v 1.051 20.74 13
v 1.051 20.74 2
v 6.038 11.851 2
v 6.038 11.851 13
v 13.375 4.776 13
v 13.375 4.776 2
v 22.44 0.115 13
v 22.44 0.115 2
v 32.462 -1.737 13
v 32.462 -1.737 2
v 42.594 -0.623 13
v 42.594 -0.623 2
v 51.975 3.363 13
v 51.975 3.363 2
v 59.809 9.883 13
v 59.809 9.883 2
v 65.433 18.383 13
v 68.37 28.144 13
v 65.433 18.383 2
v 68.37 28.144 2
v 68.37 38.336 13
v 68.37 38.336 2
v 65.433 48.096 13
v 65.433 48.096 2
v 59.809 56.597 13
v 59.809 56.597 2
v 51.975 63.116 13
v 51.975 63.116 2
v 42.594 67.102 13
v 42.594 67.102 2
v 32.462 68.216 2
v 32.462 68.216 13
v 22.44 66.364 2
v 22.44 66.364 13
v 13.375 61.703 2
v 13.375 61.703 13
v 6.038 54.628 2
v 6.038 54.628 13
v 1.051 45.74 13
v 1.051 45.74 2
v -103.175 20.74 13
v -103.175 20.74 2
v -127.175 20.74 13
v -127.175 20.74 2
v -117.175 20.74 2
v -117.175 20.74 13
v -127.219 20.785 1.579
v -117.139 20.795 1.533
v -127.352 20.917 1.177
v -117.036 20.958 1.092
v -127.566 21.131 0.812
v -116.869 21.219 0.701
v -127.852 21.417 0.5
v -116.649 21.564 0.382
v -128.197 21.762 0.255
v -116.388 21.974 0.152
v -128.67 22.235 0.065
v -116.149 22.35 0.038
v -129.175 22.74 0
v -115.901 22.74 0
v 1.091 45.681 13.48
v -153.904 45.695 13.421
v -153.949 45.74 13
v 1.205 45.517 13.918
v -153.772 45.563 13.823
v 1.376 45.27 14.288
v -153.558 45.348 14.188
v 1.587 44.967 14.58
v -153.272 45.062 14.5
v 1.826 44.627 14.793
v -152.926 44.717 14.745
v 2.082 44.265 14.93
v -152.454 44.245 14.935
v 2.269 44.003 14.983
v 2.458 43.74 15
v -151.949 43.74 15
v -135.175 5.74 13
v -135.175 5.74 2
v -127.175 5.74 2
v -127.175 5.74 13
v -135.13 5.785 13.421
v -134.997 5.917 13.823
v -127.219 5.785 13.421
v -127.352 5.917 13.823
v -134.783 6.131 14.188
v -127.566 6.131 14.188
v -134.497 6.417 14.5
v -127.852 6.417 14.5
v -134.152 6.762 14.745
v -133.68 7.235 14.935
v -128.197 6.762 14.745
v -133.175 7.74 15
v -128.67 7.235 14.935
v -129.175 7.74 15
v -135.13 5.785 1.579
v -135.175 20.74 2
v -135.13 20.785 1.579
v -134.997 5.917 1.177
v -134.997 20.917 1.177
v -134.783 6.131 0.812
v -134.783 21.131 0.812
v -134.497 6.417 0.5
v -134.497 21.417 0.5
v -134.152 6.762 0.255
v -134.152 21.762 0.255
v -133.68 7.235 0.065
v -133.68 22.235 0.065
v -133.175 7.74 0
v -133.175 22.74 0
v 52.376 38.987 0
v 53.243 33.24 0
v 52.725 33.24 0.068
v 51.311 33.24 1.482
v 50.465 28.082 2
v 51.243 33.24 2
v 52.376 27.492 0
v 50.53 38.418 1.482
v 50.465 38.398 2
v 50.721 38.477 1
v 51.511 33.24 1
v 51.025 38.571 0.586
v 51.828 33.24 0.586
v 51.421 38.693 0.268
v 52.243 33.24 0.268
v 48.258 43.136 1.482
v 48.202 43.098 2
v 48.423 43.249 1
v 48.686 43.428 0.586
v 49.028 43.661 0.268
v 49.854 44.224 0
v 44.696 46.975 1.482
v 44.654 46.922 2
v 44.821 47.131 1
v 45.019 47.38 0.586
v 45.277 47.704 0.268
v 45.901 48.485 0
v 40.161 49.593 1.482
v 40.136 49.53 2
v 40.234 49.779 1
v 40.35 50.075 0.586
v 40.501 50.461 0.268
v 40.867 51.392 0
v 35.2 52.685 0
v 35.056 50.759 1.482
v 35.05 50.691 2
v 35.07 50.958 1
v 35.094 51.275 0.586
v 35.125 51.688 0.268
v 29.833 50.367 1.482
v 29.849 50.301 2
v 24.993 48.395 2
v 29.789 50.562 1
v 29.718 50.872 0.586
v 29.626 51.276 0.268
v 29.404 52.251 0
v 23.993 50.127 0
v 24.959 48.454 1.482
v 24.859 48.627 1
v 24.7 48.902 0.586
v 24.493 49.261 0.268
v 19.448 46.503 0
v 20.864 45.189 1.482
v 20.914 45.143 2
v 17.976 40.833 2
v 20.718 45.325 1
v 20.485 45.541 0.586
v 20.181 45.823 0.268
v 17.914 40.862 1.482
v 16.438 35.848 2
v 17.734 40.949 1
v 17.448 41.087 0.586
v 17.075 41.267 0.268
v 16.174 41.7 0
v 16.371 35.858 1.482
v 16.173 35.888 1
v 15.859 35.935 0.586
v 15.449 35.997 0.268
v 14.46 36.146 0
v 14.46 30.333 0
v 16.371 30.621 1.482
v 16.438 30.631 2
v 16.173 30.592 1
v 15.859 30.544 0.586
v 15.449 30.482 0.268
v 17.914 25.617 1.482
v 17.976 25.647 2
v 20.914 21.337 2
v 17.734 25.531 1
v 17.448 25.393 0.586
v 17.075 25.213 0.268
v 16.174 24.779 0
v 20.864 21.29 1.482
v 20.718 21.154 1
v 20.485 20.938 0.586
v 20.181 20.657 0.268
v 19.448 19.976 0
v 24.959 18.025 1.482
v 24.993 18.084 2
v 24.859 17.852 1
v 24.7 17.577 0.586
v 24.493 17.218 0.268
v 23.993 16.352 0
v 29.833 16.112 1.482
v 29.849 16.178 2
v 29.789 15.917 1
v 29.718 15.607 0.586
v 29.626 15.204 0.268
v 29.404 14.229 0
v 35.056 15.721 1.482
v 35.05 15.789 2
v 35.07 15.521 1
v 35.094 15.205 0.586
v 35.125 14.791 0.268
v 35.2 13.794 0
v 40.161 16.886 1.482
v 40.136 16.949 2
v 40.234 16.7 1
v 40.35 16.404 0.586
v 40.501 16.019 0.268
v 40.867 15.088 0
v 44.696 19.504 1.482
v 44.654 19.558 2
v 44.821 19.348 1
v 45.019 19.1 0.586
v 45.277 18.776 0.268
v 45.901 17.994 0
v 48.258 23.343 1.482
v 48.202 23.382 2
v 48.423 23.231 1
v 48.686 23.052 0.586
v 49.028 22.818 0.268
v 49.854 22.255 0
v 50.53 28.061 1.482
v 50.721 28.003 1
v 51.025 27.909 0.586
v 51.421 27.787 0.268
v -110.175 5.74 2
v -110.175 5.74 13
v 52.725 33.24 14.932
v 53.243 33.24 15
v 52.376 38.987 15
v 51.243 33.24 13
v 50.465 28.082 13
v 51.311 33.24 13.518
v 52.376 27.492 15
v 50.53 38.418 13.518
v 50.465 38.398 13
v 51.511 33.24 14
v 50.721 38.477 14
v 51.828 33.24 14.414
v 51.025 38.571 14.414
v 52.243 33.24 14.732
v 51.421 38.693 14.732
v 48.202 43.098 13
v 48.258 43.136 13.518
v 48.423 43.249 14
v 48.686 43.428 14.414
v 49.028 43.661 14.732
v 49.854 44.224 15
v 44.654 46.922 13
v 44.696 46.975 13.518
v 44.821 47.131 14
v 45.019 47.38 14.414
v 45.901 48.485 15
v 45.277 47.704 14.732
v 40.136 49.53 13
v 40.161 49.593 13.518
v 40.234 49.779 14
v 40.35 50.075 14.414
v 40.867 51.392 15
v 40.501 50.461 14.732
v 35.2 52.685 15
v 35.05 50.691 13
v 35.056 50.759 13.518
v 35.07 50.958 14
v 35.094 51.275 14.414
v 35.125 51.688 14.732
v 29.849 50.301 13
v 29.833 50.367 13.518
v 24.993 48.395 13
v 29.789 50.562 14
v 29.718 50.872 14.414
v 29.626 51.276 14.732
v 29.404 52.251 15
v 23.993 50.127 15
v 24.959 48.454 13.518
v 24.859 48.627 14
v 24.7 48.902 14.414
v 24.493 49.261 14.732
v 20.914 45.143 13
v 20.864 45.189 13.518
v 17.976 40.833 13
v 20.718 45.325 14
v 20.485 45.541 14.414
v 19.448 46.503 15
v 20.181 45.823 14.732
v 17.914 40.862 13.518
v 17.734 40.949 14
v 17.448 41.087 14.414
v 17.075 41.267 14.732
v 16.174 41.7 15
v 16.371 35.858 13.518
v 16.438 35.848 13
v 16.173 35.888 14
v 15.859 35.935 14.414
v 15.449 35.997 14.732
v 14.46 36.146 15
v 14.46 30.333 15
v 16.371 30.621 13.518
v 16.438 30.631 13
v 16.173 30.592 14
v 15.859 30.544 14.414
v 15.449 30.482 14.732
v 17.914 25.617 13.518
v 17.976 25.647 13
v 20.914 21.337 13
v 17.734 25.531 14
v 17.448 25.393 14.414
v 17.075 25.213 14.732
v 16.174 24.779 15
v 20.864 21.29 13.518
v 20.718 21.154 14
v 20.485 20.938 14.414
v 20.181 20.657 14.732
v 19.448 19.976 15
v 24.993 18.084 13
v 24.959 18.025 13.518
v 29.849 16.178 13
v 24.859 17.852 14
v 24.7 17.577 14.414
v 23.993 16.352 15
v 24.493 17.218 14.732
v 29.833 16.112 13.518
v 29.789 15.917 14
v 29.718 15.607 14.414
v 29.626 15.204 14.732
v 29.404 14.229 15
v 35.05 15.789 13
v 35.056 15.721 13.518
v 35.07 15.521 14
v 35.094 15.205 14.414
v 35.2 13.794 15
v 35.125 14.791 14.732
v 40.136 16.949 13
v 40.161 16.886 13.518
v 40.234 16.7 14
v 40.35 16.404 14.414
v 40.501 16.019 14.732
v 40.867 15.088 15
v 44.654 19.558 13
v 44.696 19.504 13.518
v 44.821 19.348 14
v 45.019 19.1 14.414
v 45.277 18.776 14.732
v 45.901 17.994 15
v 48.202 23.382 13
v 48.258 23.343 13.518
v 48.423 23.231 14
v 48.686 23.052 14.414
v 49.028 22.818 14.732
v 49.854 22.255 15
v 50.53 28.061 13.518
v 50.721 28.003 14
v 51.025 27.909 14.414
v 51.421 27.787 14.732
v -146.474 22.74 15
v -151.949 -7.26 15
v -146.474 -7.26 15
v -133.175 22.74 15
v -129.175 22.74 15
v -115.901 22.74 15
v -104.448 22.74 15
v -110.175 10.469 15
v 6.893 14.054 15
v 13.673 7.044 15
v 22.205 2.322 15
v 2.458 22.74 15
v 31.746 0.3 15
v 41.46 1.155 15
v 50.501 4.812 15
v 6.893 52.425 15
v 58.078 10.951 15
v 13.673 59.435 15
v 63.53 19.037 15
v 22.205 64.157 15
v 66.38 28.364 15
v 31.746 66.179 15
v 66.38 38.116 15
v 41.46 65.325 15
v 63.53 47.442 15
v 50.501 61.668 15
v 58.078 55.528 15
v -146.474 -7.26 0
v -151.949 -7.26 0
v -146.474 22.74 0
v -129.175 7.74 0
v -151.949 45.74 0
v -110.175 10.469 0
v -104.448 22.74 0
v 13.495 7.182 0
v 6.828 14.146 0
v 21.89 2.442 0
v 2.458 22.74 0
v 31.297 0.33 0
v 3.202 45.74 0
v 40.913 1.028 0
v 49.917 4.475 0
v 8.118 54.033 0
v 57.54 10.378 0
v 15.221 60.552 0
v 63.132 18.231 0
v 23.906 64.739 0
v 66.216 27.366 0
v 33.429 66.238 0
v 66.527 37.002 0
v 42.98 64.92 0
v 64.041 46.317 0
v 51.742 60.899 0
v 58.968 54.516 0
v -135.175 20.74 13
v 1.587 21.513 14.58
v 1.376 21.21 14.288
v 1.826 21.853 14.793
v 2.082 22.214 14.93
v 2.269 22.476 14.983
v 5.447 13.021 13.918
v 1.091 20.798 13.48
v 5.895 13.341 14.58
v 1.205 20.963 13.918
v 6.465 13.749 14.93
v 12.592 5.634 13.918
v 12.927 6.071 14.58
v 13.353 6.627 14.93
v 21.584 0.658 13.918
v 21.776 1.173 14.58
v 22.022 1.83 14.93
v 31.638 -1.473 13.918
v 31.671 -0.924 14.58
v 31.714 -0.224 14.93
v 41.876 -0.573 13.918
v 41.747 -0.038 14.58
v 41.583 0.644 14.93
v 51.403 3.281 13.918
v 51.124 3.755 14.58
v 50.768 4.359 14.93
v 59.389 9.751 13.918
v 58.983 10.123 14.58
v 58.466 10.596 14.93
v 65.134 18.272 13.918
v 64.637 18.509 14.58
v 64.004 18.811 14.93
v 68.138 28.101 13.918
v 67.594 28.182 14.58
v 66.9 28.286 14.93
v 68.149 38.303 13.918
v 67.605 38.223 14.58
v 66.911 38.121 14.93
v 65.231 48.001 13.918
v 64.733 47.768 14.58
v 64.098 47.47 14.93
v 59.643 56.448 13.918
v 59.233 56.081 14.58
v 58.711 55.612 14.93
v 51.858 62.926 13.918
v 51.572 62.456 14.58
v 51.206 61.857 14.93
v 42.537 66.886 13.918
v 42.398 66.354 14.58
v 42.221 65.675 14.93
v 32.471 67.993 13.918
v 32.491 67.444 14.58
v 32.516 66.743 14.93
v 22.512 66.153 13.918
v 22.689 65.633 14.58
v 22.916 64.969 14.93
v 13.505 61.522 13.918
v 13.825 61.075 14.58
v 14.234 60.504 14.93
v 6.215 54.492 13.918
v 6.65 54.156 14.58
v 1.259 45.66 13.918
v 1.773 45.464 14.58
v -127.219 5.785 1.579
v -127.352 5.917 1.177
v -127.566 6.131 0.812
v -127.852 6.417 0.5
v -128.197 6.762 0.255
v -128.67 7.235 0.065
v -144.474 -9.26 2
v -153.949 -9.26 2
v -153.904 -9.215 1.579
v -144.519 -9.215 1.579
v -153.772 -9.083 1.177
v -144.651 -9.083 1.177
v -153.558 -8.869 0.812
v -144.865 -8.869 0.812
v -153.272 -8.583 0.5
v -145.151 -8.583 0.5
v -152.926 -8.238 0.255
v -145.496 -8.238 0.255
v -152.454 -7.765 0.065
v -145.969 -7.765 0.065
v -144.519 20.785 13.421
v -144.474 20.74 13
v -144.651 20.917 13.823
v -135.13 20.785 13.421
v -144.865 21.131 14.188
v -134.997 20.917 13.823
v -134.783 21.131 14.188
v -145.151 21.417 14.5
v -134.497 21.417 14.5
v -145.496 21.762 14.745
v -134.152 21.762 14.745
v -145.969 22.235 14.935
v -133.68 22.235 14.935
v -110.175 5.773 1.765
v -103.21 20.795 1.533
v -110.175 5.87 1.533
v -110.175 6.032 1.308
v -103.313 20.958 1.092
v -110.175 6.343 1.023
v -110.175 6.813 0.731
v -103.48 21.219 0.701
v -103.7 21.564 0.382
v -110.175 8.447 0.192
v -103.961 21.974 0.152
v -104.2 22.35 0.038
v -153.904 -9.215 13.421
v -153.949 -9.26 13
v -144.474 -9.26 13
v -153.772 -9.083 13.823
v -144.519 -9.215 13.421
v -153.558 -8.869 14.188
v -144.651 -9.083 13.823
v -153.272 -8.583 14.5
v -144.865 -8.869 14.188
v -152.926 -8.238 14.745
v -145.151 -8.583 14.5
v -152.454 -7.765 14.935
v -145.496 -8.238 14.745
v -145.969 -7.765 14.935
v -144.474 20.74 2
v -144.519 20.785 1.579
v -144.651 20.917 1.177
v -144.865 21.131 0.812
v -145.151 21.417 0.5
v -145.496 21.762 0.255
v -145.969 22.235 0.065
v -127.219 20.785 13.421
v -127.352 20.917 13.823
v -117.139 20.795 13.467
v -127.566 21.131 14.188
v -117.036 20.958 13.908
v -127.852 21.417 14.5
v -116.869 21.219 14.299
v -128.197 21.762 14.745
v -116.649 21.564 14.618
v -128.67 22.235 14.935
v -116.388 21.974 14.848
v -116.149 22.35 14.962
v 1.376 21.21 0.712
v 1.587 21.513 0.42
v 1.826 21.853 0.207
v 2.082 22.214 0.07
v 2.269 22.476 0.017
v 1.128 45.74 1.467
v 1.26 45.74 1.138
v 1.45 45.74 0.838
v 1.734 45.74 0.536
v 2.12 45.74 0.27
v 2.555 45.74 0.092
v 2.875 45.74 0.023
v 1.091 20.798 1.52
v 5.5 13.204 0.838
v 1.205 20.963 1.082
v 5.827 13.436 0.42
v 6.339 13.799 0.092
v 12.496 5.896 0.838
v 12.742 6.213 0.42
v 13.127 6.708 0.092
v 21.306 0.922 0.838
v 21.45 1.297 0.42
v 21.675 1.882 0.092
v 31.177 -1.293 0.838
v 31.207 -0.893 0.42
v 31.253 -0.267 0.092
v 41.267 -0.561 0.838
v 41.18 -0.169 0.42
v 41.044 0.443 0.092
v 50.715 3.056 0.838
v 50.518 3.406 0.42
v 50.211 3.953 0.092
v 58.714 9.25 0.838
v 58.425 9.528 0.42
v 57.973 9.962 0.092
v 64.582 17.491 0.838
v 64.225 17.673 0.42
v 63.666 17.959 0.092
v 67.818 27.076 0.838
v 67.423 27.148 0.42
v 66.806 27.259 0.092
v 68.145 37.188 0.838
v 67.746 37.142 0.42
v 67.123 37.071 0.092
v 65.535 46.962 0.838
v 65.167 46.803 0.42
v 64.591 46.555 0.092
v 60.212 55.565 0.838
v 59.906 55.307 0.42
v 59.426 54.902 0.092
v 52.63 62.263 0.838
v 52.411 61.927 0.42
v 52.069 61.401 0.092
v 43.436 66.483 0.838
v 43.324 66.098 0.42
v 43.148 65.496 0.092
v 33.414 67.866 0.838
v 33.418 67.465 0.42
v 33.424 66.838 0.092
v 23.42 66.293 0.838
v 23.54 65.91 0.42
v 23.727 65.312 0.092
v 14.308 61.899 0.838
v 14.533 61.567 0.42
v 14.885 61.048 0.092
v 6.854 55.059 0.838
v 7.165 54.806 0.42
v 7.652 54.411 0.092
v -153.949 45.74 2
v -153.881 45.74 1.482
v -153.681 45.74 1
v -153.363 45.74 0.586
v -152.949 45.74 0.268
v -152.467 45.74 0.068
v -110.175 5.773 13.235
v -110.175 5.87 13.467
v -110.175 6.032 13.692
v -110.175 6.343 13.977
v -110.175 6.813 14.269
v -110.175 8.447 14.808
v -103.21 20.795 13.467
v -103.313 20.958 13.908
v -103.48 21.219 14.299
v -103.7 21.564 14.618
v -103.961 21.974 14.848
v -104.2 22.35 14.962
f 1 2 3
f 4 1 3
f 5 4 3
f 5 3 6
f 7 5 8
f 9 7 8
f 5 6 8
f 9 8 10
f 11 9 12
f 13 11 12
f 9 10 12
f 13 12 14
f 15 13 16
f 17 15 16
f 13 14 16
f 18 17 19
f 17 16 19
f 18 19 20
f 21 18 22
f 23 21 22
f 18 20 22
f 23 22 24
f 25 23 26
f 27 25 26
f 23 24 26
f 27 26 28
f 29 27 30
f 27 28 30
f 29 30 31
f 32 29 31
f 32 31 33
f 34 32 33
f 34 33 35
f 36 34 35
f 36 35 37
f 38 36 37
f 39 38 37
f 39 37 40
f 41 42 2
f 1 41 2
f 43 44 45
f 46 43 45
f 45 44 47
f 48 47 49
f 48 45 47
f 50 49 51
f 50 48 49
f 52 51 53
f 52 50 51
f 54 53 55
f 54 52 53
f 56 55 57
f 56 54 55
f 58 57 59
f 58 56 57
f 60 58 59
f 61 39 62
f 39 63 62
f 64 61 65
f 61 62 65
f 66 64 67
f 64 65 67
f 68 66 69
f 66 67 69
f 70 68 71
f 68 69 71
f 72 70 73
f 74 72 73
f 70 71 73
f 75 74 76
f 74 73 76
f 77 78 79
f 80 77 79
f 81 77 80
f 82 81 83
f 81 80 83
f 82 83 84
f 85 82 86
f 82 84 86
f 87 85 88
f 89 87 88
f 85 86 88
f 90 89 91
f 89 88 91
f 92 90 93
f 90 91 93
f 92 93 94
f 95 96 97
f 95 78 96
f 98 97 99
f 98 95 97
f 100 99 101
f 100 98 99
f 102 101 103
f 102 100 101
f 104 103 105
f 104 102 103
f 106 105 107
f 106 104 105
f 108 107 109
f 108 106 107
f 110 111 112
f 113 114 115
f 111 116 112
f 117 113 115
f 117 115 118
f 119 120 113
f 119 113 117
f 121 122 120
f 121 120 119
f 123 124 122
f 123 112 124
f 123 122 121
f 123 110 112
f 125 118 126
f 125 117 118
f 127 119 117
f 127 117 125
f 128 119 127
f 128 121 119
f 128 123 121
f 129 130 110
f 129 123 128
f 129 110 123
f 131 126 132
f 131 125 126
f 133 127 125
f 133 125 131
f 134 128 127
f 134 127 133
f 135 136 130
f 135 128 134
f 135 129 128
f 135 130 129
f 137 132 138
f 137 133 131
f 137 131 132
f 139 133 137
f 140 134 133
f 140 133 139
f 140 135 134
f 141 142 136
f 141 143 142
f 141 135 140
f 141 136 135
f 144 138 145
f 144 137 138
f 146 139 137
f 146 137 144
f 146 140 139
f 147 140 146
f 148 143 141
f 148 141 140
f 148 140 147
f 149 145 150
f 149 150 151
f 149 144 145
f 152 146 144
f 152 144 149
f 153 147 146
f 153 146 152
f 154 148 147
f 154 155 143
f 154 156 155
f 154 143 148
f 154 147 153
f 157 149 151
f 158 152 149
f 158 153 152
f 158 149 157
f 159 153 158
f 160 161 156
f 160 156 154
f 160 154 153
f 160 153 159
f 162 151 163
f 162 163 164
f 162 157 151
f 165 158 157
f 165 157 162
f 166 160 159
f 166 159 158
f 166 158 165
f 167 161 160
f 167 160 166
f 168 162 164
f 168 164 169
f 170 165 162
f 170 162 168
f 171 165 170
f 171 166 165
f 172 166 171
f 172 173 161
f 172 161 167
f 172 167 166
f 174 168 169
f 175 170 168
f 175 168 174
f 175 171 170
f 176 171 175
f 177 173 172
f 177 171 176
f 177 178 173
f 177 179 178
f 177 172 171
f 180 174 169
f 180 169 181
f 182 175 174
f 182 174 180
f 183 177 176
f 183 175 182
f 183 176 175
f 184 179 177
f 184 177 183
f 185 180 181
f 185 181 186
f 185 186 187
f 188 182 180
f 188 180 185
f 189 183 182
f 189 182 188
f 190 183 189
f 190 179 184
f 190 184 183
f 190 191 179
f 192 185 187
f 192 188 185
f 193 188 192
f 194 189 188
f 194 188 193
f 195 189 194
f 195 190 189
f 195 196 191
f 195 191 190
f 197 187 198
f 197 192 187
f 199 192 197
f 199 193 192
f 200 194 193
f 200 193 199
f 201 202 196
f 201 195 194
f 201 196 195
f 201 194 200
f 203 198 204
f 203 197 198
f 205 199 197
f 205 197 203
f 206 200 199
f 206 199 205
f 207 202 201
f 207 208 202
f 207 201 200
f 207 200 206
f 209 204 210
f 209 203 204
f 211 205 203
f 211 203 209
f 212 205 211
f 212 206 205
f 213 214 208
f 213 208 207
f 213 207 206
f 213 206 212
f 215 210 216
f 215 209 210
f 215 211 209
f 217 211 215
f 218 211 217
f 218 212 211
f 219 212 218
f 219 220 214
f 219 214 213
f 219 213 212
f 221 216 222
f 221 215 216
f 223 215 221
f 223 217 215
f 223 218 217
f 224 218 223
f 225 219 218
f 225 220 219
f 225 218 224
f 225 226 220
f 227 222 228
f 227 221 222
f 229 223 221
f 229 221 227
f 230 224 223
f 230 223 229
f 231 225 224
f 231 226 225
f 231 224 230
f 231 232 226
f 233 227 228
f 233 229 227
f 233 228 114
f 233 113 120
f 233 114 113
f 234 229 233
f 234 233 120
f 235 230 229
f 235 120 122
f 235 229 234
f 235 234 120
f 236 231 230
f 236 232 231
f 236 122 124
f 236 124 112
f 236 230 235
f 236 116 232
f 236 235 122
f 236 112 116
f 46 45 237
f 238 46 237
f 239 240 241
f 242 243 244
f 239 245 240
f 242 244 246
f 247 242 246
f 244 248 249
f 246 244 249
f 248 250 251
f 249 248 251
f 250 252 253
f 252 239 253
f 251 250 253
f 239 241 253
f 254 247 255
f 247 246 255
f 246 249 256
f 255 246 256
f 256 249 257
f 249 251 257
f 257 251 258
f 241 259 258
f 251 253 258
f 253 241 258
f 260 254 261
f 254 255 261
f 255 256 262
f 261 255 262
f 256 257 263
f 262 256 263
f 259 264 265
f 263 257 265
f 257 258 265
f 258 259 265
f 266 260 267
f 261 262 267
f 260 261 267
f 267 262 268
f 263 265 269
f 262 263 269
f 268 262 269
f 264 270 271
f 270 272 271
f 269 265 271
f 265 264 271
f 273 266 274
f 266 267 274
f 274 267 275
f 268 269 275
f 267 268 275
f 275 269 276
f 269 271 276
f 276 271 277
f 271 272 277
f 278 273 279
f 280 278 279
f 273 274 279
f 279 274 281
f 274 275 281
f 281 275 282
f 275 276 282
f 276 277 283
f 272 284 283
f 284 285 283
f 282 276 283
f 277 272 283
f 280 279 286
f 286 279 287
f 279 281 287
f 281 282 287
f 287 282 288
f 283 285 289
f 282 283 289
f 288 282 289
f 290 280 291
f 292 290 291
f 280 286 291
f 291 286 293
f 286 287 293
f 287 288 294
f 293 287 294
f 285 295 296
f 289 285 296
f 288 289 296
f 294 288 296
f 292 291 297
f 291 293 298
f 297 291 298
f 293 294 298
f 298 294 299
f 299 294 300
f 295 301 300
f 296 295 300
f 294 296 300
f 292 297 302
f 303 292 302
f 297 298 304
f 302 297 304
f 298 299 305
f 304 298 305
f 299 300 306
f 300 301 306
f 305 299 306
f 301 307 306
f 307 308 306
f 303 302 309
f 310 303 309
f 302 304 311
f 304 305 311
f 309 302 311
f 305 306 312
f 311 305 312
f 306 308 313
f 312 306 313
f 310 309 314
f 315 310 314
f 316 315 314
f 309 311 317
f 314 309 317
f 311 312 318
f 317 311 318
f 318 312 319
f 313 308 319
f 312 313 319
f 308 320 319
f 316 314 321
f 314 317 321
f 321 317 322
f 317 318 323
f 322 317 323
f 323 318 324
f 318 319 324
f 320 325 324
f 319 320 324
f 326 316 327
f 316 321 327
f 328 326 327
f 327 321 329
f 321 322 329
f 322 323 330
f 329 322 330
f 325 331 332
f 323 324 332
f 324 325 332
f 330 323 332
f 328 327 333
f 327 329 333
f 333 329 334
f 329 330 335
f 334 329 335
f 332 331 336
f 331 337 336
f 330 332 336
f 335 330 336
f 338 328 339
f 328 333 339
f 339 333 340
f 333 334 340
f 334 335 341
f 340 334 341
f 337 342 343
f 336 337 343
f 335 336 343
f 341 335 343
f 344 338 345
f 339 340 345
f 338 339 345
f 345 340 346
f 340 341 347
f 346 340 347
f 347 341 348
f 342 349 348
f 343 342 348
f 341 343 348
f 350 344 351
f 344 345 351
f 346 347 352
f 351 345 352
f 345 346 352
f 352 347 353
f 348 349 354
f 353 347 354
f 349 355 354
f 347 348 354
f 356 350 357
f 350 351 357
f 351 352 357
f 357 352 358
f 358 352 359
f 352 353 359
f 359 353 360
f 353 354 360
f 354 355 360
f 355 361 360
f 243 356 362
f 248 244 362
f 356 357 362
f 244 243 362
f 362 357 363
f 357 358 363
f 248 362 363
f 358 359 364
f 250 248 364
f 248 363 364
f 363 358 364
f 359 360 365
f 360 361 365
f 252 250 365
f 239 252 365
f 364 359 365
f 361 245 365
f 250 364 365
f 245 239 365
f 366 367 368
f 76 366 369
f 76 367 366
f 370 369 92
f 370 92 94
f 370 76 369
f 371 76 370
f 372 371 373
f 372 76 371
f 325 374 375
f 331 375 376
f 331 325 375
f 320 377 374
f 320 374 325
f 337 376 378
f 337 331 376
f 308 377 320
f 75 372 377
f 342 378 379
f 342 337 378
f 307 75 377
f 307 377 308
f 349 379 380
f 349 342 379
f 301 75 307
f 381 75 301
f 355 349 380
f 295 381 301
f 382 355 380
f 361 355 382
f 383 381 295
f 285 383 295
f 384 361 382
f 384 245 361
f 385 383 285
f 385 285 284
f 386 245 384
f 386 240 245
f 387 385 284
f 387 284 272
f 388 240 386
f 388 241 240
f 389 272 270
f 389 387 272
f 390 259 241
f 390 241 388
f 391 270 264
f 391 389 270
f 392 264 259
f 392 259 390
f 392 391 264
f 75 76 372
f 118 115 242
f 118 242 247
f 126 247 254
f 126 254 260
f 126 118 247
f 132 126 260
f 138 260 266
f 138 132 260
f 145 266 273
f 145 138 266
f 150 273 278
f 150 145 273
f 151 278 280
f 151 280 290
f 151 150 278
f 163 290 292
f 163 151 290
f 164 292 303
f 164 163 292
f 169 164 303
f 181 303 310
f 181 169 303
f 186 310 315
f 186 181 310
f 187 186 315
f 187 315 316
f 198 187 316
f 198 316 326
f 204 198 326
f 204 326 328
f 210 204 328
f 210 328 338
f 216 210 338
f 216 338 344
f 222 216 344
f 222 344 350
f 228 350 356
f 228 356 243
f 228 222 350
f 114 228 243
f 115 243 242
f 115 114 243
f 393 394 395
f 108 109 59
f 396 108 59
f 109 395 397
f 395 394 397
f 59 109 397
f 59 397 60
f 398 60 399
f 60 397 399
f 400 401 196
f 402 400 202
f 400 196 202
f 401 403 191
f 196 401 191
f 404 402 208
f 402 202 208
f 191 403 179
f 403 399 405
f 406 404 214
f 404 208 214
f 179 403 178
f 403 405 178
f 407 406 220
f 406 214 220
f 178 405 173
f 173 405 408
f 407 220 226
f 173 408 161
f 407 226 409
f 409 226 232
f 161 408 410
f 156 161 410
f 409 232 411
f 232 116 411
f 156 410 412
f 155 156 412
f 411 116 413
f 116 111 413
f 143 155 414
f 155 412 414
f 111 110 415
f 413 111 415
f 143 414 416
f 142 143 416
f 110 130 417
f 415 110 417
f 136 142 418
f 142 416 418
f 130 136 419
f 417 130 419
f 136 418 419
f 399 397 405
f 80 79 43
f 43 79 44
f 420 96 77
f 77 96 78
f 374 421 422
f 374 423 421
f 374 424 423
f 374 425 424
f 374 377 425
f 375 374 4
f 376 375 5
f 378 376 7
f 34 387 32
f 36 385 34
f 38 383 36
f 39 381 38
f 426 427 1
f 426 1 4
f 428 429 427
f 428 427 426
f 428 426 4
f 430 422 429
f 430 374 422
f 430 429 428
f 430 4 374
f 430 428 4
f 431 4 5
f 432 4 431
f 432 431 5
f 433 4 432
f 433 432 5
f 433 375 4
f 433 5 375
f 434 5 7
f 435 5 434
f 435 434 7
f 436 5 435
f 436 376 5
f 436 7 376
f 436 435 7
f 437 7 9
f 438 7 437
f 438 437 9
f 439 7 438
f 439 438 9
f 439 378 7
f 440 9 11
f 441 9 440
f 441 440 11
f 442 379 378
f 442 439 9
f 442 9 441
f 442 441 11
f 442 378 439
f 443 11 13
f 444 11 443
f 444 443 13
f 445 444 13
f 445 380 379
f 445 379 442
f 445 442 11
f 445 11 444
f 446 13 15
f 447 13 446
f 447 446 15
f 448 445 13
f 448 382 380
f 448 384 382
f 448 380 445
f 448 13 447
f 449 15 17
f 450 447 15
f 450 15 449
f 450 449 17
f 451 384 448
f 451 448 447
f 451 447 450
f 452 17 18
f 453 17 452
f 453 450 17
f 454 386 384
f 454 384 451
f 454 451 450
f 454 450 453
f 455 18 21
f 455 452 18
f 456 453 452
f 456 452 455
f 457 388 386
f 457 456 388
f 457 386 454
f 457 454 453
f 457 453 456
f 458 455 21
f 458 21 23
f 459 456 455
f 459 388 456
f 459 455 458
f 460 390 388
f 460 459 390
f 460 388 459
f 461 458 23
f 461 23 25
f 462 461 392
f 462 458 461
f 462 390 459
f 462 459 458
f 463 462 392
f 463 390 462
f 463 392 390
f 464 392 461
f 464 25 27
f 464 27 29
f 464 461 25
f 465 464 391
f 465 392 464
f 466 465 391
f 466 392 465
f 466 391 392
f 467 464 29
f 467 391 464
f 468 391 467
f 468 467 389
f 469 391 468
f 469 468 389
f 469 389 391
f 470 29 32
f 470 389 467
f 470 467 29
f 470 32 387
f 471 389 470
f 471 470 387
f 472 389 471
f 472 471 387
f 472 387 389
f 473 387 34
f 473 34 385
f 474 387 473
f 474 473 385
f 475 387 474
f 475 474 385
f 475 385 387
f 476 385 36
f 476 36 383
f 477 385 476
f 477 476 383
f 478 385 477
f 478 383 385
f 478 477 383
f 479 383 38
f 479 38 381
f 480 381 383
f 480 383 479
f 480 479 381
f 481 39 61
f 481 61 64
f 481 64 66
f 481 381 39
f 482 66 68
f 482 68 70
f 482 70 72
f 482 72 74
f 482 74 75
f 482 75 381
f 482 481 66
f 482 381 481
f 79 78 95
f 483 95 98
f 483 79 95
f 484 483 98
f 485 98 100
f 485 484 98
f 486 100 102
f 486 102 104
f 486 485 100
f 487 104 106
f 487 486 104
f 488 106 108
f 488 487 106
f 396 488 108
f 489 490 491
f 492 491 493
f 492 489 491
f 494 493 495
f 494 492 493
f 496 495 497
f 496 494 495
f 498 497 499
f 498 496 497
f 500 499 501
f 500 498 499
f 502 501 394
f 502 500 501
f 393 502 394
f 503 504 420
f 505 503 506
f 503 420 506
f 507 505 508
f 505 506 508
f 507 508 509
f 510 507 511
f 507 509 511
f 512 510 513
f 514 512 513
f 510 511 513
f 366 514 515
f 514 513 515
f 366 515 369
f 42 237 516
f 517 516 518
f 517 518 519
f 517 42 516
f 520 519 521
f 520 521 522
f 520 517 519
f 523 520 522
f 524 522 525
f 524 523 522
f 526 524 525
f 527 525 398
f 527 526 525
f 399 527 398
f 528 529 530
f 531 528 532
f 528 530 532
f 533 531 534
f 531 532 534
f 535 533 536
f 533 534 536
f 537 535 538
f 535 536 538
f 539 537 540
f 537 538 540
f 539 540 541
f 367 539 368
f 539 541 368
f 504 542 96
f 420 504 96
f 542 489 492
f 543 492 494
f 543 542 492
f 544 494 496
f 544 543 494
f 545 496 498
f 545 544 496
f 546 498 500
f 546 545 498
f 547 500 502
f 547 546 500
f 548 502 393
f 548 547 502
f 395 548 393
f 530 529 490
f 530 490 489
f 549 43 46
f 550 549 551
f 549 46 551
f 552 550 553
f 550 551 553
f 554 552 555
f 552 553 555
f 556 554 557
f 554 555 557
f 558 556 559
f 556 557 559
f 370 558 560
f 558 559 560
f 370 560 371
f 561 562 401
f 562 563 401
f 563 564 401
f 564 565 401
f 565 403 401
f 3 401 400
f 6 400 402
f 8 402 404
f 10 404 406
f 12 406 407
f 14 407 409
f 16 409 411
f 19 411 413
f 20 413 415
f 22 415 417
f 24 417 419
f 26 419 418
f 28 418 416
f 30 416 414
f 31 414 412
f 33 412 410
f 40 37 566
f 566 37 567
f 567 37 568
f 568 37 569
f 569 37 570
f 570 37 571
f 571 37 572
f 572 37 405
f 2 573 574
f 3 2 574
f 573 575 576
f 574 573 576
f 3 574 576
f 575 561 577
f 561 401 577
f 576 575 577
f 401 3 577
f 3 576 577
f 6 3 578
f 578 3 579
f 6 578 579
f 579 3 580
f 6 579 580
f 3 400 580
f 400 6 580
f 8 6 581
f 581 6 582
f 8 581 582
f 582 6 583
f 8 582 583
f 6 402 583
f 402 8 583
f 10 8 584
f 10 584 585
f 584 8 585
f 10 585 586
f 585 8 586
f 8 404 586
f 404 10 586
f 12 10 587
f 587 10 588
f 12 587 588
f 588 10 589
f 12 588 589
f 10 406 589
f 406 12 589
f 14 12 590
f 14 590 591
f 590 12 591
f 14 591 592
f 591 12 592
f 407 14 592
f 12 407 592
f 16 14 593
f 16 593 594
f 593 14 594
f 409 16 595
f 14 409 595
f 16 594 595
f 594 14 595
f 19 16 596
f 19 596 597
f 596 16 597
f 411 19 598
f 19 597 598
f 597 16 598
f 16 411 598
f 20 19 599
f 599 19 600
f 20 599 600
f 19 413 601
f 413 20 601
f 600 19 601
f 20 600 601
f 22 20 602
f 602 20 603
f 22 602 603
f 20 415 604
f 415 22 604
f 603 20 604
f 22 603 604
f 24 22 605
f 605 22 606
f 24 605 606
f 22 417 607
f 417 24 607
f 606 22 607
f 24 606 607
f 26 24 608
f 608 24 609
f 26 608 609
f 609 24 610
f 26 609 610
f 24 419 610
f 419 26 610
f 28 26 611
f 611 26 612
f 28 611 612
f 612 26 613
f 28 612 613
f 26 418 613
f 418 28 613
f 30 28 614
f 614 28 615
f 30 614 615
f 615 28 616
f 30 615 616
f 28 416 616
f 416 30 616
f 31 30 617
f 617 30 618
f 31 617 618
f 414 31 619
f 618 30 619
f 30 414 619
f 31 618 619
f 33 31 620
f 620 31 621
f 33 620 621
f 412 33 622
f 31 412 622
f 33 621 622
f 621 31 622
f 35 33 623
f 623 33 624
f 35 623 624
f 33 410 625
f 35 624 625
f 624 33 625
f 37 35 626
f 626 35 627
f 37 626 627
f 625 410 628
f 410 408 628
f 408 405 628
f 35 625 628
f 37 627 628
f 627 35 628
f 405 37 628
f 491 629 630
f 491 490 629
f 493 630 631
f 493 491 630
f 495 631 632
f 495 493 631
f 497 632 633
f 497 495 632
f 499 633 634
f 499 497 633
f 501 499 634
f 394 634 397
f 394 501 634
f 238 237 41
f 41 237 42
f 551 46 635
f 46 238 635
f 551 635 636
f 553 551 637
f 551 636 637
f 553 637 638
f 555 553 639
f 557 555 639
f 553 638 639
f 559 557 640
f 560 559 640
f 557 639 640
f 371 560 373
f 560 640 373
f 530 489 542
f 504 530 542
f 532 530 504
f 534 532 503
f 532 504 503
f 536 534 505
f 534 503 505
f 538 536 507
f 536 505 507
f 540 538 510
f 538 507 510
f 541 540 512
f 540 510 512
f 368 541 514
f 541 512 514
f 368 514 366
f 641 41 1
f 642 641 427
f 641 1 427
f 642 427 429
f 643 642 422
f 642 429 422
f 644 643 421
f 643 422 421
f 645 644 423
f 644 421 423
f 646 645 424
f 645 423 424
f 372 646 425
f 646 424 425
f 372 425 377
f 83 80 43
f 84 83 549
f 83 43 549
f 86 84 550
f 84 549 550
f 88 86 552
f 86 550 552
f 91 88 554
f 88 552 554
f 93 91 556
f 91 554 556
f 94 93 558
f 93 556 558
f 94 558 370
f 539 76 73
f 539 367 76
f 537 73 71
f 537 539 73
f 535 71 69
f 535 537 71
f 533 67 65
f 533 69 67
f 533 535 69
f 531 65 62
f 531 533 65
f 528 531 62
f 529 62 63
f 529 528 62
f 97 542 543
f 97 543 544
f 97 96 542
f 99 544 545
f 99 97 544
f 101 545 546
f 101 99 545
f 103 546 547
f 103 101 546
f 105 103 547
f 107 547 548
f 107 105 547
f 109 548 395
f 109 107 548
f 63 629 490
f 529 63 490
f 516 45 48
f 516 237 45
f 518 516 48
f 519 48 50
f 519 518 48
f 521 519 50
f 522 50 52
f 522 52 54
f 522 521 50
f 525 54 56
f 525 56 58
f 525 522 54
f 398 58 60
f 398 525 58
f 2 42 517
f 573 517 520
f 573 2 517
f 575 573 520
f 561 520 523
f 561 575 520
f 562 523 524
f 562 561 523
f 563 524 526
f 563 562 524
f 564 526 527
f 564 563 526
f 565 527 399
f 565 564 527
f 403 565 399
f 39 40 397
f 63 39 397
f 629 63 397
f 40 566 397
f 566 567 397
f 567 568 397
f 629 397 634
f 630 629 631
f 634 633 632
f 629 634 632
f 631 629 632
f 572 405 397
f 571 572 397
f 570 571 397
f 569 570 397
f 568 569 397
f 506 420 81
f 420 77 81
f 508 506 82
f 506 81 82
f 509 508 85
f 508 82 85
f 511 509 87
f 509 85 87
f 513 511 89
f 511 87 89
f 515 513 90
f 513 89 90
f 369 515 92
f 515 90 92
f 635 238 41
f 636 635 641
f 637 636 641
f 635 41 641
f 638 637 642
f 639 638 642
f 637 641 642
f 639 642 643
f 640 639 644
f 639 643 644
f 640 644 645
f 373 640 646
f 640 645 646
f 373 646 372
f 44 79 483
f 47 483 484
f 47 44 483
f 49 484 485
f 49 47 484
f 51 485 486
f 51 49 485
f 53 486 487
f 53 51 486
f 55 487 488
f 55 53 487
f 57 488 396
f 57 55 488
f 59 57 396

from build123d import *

# Parameters (mm, degrees)
F0_W     = 9.4753347638
F0_H     = 30
F0_R     = 17.5
F1_DEPTH = 15
F2_R     = 2
F3_R     = 2


# Not quite as in the source:
# - a feature names something its author has since deleted; it is built from what else it names


with BuildPart() as f1:
    # F0 (on Top) → F1 (new body)
    with BuildSketch(Plane.XY):
        with Locations((-149.2113988997, 5.7397255301)):
            Rectangle(F0_W, F0_H)
        Polygon((1.0509337184, 20.7397255301), (1.0509337184, 45.7397255301), (-153.9490662816, 45.7397255301), (-153.9490662816, 20.7397255301), (-144.4737315178, 20.7397255301), (-135.1745359898, 20.7397255301), (-134.4737315178, 20.7397255301), (-127.1745359898, 20.7397255301), (-117.1745359898, 20.7397255301), (-103.1745359898, 20.7397255301), align=None)
        with BuildLine():
            ThreePointArc((1.0509337184, 20.7397255301), (68.742675795, 33.2397255301), (1.0509337184, 45.7397255301))
            Line((1.0509337184, 45.7397255301), (1.0509337184, 20.7397255301))
        make_face()
        with Locations((33.742675795, 33.2397255301)):
            Circle(F0_R, mode=Mode.SUBTRACT)
        Polygon((-134.4737315178, 20.7397255301), (-135.1745359898, 20.7397255301), (-135.1745359898, 5.7397255301), (-134.4737315178, 5.7397255301), (-127.1745359898, 5.7397255301), (-127.1745359898, 20.7397255301), align=None)
        Polygon((-110.1745359898, 5.7397255301), (-103.1745359898, 20.7397255301), (-117.1745359898, 20.7397255301), align=None)
    extrude(amount=F1_DEPTH)

    # F2
    f2_edges = [f1.edges().sort_by_distance(p)[0] for p in [
        (68.742676, 33.239726, 0),
        (16.242676, 33.239726, 0),
        (-51.061801, 20.739726, 0),
        (-106.674536, 13.239726, 0),
        (-127.174536, 13.239726, 0),
        (-122.174536, 20.739726, 0),
        (-113.674536, 13.239726, 0),
        (-135.174536, 13.239726, 0),
        (-131.174536, 5.739726, 0),
        (-139.824134, 20.739726, 0),
        (-144.473732, 5.739726, 0),
        (-149.211399, -9.260274, 0),
        (-153.949066, 18.239726, 0),
    ]]
    fillet(f2_edges, radius=F2_R)

    # F3
    f3_edges = [f1.edges().sort_by_distance(p)[0] for p in [
        (-149.211399, -9.260274, 15),
        (-144.473732, 5.739726, 15),
        (-139.824134, 20.739726, 15),
        (-135.174536, 13.239726, 15),
        (-131.174536, 5.739726, 15),
        (-127.174536, 13.239726, 15),
        (-122.174536, 20.739726, 15),
        (-113.674536, 13.239726, 15),
        (-106.674536, 13.239726, 15),
        (-51.061801, 20.739726, 15),
        (68.742676, 33.239726, 15),
        (-76.449066, 45.739726, 15),
        (-153.949066, 18.239726, 15),
        (16.242676, 33.239726, 15),
    ]]
    fillet(f3_edges, radius=F3_R)


solid = f1.part
